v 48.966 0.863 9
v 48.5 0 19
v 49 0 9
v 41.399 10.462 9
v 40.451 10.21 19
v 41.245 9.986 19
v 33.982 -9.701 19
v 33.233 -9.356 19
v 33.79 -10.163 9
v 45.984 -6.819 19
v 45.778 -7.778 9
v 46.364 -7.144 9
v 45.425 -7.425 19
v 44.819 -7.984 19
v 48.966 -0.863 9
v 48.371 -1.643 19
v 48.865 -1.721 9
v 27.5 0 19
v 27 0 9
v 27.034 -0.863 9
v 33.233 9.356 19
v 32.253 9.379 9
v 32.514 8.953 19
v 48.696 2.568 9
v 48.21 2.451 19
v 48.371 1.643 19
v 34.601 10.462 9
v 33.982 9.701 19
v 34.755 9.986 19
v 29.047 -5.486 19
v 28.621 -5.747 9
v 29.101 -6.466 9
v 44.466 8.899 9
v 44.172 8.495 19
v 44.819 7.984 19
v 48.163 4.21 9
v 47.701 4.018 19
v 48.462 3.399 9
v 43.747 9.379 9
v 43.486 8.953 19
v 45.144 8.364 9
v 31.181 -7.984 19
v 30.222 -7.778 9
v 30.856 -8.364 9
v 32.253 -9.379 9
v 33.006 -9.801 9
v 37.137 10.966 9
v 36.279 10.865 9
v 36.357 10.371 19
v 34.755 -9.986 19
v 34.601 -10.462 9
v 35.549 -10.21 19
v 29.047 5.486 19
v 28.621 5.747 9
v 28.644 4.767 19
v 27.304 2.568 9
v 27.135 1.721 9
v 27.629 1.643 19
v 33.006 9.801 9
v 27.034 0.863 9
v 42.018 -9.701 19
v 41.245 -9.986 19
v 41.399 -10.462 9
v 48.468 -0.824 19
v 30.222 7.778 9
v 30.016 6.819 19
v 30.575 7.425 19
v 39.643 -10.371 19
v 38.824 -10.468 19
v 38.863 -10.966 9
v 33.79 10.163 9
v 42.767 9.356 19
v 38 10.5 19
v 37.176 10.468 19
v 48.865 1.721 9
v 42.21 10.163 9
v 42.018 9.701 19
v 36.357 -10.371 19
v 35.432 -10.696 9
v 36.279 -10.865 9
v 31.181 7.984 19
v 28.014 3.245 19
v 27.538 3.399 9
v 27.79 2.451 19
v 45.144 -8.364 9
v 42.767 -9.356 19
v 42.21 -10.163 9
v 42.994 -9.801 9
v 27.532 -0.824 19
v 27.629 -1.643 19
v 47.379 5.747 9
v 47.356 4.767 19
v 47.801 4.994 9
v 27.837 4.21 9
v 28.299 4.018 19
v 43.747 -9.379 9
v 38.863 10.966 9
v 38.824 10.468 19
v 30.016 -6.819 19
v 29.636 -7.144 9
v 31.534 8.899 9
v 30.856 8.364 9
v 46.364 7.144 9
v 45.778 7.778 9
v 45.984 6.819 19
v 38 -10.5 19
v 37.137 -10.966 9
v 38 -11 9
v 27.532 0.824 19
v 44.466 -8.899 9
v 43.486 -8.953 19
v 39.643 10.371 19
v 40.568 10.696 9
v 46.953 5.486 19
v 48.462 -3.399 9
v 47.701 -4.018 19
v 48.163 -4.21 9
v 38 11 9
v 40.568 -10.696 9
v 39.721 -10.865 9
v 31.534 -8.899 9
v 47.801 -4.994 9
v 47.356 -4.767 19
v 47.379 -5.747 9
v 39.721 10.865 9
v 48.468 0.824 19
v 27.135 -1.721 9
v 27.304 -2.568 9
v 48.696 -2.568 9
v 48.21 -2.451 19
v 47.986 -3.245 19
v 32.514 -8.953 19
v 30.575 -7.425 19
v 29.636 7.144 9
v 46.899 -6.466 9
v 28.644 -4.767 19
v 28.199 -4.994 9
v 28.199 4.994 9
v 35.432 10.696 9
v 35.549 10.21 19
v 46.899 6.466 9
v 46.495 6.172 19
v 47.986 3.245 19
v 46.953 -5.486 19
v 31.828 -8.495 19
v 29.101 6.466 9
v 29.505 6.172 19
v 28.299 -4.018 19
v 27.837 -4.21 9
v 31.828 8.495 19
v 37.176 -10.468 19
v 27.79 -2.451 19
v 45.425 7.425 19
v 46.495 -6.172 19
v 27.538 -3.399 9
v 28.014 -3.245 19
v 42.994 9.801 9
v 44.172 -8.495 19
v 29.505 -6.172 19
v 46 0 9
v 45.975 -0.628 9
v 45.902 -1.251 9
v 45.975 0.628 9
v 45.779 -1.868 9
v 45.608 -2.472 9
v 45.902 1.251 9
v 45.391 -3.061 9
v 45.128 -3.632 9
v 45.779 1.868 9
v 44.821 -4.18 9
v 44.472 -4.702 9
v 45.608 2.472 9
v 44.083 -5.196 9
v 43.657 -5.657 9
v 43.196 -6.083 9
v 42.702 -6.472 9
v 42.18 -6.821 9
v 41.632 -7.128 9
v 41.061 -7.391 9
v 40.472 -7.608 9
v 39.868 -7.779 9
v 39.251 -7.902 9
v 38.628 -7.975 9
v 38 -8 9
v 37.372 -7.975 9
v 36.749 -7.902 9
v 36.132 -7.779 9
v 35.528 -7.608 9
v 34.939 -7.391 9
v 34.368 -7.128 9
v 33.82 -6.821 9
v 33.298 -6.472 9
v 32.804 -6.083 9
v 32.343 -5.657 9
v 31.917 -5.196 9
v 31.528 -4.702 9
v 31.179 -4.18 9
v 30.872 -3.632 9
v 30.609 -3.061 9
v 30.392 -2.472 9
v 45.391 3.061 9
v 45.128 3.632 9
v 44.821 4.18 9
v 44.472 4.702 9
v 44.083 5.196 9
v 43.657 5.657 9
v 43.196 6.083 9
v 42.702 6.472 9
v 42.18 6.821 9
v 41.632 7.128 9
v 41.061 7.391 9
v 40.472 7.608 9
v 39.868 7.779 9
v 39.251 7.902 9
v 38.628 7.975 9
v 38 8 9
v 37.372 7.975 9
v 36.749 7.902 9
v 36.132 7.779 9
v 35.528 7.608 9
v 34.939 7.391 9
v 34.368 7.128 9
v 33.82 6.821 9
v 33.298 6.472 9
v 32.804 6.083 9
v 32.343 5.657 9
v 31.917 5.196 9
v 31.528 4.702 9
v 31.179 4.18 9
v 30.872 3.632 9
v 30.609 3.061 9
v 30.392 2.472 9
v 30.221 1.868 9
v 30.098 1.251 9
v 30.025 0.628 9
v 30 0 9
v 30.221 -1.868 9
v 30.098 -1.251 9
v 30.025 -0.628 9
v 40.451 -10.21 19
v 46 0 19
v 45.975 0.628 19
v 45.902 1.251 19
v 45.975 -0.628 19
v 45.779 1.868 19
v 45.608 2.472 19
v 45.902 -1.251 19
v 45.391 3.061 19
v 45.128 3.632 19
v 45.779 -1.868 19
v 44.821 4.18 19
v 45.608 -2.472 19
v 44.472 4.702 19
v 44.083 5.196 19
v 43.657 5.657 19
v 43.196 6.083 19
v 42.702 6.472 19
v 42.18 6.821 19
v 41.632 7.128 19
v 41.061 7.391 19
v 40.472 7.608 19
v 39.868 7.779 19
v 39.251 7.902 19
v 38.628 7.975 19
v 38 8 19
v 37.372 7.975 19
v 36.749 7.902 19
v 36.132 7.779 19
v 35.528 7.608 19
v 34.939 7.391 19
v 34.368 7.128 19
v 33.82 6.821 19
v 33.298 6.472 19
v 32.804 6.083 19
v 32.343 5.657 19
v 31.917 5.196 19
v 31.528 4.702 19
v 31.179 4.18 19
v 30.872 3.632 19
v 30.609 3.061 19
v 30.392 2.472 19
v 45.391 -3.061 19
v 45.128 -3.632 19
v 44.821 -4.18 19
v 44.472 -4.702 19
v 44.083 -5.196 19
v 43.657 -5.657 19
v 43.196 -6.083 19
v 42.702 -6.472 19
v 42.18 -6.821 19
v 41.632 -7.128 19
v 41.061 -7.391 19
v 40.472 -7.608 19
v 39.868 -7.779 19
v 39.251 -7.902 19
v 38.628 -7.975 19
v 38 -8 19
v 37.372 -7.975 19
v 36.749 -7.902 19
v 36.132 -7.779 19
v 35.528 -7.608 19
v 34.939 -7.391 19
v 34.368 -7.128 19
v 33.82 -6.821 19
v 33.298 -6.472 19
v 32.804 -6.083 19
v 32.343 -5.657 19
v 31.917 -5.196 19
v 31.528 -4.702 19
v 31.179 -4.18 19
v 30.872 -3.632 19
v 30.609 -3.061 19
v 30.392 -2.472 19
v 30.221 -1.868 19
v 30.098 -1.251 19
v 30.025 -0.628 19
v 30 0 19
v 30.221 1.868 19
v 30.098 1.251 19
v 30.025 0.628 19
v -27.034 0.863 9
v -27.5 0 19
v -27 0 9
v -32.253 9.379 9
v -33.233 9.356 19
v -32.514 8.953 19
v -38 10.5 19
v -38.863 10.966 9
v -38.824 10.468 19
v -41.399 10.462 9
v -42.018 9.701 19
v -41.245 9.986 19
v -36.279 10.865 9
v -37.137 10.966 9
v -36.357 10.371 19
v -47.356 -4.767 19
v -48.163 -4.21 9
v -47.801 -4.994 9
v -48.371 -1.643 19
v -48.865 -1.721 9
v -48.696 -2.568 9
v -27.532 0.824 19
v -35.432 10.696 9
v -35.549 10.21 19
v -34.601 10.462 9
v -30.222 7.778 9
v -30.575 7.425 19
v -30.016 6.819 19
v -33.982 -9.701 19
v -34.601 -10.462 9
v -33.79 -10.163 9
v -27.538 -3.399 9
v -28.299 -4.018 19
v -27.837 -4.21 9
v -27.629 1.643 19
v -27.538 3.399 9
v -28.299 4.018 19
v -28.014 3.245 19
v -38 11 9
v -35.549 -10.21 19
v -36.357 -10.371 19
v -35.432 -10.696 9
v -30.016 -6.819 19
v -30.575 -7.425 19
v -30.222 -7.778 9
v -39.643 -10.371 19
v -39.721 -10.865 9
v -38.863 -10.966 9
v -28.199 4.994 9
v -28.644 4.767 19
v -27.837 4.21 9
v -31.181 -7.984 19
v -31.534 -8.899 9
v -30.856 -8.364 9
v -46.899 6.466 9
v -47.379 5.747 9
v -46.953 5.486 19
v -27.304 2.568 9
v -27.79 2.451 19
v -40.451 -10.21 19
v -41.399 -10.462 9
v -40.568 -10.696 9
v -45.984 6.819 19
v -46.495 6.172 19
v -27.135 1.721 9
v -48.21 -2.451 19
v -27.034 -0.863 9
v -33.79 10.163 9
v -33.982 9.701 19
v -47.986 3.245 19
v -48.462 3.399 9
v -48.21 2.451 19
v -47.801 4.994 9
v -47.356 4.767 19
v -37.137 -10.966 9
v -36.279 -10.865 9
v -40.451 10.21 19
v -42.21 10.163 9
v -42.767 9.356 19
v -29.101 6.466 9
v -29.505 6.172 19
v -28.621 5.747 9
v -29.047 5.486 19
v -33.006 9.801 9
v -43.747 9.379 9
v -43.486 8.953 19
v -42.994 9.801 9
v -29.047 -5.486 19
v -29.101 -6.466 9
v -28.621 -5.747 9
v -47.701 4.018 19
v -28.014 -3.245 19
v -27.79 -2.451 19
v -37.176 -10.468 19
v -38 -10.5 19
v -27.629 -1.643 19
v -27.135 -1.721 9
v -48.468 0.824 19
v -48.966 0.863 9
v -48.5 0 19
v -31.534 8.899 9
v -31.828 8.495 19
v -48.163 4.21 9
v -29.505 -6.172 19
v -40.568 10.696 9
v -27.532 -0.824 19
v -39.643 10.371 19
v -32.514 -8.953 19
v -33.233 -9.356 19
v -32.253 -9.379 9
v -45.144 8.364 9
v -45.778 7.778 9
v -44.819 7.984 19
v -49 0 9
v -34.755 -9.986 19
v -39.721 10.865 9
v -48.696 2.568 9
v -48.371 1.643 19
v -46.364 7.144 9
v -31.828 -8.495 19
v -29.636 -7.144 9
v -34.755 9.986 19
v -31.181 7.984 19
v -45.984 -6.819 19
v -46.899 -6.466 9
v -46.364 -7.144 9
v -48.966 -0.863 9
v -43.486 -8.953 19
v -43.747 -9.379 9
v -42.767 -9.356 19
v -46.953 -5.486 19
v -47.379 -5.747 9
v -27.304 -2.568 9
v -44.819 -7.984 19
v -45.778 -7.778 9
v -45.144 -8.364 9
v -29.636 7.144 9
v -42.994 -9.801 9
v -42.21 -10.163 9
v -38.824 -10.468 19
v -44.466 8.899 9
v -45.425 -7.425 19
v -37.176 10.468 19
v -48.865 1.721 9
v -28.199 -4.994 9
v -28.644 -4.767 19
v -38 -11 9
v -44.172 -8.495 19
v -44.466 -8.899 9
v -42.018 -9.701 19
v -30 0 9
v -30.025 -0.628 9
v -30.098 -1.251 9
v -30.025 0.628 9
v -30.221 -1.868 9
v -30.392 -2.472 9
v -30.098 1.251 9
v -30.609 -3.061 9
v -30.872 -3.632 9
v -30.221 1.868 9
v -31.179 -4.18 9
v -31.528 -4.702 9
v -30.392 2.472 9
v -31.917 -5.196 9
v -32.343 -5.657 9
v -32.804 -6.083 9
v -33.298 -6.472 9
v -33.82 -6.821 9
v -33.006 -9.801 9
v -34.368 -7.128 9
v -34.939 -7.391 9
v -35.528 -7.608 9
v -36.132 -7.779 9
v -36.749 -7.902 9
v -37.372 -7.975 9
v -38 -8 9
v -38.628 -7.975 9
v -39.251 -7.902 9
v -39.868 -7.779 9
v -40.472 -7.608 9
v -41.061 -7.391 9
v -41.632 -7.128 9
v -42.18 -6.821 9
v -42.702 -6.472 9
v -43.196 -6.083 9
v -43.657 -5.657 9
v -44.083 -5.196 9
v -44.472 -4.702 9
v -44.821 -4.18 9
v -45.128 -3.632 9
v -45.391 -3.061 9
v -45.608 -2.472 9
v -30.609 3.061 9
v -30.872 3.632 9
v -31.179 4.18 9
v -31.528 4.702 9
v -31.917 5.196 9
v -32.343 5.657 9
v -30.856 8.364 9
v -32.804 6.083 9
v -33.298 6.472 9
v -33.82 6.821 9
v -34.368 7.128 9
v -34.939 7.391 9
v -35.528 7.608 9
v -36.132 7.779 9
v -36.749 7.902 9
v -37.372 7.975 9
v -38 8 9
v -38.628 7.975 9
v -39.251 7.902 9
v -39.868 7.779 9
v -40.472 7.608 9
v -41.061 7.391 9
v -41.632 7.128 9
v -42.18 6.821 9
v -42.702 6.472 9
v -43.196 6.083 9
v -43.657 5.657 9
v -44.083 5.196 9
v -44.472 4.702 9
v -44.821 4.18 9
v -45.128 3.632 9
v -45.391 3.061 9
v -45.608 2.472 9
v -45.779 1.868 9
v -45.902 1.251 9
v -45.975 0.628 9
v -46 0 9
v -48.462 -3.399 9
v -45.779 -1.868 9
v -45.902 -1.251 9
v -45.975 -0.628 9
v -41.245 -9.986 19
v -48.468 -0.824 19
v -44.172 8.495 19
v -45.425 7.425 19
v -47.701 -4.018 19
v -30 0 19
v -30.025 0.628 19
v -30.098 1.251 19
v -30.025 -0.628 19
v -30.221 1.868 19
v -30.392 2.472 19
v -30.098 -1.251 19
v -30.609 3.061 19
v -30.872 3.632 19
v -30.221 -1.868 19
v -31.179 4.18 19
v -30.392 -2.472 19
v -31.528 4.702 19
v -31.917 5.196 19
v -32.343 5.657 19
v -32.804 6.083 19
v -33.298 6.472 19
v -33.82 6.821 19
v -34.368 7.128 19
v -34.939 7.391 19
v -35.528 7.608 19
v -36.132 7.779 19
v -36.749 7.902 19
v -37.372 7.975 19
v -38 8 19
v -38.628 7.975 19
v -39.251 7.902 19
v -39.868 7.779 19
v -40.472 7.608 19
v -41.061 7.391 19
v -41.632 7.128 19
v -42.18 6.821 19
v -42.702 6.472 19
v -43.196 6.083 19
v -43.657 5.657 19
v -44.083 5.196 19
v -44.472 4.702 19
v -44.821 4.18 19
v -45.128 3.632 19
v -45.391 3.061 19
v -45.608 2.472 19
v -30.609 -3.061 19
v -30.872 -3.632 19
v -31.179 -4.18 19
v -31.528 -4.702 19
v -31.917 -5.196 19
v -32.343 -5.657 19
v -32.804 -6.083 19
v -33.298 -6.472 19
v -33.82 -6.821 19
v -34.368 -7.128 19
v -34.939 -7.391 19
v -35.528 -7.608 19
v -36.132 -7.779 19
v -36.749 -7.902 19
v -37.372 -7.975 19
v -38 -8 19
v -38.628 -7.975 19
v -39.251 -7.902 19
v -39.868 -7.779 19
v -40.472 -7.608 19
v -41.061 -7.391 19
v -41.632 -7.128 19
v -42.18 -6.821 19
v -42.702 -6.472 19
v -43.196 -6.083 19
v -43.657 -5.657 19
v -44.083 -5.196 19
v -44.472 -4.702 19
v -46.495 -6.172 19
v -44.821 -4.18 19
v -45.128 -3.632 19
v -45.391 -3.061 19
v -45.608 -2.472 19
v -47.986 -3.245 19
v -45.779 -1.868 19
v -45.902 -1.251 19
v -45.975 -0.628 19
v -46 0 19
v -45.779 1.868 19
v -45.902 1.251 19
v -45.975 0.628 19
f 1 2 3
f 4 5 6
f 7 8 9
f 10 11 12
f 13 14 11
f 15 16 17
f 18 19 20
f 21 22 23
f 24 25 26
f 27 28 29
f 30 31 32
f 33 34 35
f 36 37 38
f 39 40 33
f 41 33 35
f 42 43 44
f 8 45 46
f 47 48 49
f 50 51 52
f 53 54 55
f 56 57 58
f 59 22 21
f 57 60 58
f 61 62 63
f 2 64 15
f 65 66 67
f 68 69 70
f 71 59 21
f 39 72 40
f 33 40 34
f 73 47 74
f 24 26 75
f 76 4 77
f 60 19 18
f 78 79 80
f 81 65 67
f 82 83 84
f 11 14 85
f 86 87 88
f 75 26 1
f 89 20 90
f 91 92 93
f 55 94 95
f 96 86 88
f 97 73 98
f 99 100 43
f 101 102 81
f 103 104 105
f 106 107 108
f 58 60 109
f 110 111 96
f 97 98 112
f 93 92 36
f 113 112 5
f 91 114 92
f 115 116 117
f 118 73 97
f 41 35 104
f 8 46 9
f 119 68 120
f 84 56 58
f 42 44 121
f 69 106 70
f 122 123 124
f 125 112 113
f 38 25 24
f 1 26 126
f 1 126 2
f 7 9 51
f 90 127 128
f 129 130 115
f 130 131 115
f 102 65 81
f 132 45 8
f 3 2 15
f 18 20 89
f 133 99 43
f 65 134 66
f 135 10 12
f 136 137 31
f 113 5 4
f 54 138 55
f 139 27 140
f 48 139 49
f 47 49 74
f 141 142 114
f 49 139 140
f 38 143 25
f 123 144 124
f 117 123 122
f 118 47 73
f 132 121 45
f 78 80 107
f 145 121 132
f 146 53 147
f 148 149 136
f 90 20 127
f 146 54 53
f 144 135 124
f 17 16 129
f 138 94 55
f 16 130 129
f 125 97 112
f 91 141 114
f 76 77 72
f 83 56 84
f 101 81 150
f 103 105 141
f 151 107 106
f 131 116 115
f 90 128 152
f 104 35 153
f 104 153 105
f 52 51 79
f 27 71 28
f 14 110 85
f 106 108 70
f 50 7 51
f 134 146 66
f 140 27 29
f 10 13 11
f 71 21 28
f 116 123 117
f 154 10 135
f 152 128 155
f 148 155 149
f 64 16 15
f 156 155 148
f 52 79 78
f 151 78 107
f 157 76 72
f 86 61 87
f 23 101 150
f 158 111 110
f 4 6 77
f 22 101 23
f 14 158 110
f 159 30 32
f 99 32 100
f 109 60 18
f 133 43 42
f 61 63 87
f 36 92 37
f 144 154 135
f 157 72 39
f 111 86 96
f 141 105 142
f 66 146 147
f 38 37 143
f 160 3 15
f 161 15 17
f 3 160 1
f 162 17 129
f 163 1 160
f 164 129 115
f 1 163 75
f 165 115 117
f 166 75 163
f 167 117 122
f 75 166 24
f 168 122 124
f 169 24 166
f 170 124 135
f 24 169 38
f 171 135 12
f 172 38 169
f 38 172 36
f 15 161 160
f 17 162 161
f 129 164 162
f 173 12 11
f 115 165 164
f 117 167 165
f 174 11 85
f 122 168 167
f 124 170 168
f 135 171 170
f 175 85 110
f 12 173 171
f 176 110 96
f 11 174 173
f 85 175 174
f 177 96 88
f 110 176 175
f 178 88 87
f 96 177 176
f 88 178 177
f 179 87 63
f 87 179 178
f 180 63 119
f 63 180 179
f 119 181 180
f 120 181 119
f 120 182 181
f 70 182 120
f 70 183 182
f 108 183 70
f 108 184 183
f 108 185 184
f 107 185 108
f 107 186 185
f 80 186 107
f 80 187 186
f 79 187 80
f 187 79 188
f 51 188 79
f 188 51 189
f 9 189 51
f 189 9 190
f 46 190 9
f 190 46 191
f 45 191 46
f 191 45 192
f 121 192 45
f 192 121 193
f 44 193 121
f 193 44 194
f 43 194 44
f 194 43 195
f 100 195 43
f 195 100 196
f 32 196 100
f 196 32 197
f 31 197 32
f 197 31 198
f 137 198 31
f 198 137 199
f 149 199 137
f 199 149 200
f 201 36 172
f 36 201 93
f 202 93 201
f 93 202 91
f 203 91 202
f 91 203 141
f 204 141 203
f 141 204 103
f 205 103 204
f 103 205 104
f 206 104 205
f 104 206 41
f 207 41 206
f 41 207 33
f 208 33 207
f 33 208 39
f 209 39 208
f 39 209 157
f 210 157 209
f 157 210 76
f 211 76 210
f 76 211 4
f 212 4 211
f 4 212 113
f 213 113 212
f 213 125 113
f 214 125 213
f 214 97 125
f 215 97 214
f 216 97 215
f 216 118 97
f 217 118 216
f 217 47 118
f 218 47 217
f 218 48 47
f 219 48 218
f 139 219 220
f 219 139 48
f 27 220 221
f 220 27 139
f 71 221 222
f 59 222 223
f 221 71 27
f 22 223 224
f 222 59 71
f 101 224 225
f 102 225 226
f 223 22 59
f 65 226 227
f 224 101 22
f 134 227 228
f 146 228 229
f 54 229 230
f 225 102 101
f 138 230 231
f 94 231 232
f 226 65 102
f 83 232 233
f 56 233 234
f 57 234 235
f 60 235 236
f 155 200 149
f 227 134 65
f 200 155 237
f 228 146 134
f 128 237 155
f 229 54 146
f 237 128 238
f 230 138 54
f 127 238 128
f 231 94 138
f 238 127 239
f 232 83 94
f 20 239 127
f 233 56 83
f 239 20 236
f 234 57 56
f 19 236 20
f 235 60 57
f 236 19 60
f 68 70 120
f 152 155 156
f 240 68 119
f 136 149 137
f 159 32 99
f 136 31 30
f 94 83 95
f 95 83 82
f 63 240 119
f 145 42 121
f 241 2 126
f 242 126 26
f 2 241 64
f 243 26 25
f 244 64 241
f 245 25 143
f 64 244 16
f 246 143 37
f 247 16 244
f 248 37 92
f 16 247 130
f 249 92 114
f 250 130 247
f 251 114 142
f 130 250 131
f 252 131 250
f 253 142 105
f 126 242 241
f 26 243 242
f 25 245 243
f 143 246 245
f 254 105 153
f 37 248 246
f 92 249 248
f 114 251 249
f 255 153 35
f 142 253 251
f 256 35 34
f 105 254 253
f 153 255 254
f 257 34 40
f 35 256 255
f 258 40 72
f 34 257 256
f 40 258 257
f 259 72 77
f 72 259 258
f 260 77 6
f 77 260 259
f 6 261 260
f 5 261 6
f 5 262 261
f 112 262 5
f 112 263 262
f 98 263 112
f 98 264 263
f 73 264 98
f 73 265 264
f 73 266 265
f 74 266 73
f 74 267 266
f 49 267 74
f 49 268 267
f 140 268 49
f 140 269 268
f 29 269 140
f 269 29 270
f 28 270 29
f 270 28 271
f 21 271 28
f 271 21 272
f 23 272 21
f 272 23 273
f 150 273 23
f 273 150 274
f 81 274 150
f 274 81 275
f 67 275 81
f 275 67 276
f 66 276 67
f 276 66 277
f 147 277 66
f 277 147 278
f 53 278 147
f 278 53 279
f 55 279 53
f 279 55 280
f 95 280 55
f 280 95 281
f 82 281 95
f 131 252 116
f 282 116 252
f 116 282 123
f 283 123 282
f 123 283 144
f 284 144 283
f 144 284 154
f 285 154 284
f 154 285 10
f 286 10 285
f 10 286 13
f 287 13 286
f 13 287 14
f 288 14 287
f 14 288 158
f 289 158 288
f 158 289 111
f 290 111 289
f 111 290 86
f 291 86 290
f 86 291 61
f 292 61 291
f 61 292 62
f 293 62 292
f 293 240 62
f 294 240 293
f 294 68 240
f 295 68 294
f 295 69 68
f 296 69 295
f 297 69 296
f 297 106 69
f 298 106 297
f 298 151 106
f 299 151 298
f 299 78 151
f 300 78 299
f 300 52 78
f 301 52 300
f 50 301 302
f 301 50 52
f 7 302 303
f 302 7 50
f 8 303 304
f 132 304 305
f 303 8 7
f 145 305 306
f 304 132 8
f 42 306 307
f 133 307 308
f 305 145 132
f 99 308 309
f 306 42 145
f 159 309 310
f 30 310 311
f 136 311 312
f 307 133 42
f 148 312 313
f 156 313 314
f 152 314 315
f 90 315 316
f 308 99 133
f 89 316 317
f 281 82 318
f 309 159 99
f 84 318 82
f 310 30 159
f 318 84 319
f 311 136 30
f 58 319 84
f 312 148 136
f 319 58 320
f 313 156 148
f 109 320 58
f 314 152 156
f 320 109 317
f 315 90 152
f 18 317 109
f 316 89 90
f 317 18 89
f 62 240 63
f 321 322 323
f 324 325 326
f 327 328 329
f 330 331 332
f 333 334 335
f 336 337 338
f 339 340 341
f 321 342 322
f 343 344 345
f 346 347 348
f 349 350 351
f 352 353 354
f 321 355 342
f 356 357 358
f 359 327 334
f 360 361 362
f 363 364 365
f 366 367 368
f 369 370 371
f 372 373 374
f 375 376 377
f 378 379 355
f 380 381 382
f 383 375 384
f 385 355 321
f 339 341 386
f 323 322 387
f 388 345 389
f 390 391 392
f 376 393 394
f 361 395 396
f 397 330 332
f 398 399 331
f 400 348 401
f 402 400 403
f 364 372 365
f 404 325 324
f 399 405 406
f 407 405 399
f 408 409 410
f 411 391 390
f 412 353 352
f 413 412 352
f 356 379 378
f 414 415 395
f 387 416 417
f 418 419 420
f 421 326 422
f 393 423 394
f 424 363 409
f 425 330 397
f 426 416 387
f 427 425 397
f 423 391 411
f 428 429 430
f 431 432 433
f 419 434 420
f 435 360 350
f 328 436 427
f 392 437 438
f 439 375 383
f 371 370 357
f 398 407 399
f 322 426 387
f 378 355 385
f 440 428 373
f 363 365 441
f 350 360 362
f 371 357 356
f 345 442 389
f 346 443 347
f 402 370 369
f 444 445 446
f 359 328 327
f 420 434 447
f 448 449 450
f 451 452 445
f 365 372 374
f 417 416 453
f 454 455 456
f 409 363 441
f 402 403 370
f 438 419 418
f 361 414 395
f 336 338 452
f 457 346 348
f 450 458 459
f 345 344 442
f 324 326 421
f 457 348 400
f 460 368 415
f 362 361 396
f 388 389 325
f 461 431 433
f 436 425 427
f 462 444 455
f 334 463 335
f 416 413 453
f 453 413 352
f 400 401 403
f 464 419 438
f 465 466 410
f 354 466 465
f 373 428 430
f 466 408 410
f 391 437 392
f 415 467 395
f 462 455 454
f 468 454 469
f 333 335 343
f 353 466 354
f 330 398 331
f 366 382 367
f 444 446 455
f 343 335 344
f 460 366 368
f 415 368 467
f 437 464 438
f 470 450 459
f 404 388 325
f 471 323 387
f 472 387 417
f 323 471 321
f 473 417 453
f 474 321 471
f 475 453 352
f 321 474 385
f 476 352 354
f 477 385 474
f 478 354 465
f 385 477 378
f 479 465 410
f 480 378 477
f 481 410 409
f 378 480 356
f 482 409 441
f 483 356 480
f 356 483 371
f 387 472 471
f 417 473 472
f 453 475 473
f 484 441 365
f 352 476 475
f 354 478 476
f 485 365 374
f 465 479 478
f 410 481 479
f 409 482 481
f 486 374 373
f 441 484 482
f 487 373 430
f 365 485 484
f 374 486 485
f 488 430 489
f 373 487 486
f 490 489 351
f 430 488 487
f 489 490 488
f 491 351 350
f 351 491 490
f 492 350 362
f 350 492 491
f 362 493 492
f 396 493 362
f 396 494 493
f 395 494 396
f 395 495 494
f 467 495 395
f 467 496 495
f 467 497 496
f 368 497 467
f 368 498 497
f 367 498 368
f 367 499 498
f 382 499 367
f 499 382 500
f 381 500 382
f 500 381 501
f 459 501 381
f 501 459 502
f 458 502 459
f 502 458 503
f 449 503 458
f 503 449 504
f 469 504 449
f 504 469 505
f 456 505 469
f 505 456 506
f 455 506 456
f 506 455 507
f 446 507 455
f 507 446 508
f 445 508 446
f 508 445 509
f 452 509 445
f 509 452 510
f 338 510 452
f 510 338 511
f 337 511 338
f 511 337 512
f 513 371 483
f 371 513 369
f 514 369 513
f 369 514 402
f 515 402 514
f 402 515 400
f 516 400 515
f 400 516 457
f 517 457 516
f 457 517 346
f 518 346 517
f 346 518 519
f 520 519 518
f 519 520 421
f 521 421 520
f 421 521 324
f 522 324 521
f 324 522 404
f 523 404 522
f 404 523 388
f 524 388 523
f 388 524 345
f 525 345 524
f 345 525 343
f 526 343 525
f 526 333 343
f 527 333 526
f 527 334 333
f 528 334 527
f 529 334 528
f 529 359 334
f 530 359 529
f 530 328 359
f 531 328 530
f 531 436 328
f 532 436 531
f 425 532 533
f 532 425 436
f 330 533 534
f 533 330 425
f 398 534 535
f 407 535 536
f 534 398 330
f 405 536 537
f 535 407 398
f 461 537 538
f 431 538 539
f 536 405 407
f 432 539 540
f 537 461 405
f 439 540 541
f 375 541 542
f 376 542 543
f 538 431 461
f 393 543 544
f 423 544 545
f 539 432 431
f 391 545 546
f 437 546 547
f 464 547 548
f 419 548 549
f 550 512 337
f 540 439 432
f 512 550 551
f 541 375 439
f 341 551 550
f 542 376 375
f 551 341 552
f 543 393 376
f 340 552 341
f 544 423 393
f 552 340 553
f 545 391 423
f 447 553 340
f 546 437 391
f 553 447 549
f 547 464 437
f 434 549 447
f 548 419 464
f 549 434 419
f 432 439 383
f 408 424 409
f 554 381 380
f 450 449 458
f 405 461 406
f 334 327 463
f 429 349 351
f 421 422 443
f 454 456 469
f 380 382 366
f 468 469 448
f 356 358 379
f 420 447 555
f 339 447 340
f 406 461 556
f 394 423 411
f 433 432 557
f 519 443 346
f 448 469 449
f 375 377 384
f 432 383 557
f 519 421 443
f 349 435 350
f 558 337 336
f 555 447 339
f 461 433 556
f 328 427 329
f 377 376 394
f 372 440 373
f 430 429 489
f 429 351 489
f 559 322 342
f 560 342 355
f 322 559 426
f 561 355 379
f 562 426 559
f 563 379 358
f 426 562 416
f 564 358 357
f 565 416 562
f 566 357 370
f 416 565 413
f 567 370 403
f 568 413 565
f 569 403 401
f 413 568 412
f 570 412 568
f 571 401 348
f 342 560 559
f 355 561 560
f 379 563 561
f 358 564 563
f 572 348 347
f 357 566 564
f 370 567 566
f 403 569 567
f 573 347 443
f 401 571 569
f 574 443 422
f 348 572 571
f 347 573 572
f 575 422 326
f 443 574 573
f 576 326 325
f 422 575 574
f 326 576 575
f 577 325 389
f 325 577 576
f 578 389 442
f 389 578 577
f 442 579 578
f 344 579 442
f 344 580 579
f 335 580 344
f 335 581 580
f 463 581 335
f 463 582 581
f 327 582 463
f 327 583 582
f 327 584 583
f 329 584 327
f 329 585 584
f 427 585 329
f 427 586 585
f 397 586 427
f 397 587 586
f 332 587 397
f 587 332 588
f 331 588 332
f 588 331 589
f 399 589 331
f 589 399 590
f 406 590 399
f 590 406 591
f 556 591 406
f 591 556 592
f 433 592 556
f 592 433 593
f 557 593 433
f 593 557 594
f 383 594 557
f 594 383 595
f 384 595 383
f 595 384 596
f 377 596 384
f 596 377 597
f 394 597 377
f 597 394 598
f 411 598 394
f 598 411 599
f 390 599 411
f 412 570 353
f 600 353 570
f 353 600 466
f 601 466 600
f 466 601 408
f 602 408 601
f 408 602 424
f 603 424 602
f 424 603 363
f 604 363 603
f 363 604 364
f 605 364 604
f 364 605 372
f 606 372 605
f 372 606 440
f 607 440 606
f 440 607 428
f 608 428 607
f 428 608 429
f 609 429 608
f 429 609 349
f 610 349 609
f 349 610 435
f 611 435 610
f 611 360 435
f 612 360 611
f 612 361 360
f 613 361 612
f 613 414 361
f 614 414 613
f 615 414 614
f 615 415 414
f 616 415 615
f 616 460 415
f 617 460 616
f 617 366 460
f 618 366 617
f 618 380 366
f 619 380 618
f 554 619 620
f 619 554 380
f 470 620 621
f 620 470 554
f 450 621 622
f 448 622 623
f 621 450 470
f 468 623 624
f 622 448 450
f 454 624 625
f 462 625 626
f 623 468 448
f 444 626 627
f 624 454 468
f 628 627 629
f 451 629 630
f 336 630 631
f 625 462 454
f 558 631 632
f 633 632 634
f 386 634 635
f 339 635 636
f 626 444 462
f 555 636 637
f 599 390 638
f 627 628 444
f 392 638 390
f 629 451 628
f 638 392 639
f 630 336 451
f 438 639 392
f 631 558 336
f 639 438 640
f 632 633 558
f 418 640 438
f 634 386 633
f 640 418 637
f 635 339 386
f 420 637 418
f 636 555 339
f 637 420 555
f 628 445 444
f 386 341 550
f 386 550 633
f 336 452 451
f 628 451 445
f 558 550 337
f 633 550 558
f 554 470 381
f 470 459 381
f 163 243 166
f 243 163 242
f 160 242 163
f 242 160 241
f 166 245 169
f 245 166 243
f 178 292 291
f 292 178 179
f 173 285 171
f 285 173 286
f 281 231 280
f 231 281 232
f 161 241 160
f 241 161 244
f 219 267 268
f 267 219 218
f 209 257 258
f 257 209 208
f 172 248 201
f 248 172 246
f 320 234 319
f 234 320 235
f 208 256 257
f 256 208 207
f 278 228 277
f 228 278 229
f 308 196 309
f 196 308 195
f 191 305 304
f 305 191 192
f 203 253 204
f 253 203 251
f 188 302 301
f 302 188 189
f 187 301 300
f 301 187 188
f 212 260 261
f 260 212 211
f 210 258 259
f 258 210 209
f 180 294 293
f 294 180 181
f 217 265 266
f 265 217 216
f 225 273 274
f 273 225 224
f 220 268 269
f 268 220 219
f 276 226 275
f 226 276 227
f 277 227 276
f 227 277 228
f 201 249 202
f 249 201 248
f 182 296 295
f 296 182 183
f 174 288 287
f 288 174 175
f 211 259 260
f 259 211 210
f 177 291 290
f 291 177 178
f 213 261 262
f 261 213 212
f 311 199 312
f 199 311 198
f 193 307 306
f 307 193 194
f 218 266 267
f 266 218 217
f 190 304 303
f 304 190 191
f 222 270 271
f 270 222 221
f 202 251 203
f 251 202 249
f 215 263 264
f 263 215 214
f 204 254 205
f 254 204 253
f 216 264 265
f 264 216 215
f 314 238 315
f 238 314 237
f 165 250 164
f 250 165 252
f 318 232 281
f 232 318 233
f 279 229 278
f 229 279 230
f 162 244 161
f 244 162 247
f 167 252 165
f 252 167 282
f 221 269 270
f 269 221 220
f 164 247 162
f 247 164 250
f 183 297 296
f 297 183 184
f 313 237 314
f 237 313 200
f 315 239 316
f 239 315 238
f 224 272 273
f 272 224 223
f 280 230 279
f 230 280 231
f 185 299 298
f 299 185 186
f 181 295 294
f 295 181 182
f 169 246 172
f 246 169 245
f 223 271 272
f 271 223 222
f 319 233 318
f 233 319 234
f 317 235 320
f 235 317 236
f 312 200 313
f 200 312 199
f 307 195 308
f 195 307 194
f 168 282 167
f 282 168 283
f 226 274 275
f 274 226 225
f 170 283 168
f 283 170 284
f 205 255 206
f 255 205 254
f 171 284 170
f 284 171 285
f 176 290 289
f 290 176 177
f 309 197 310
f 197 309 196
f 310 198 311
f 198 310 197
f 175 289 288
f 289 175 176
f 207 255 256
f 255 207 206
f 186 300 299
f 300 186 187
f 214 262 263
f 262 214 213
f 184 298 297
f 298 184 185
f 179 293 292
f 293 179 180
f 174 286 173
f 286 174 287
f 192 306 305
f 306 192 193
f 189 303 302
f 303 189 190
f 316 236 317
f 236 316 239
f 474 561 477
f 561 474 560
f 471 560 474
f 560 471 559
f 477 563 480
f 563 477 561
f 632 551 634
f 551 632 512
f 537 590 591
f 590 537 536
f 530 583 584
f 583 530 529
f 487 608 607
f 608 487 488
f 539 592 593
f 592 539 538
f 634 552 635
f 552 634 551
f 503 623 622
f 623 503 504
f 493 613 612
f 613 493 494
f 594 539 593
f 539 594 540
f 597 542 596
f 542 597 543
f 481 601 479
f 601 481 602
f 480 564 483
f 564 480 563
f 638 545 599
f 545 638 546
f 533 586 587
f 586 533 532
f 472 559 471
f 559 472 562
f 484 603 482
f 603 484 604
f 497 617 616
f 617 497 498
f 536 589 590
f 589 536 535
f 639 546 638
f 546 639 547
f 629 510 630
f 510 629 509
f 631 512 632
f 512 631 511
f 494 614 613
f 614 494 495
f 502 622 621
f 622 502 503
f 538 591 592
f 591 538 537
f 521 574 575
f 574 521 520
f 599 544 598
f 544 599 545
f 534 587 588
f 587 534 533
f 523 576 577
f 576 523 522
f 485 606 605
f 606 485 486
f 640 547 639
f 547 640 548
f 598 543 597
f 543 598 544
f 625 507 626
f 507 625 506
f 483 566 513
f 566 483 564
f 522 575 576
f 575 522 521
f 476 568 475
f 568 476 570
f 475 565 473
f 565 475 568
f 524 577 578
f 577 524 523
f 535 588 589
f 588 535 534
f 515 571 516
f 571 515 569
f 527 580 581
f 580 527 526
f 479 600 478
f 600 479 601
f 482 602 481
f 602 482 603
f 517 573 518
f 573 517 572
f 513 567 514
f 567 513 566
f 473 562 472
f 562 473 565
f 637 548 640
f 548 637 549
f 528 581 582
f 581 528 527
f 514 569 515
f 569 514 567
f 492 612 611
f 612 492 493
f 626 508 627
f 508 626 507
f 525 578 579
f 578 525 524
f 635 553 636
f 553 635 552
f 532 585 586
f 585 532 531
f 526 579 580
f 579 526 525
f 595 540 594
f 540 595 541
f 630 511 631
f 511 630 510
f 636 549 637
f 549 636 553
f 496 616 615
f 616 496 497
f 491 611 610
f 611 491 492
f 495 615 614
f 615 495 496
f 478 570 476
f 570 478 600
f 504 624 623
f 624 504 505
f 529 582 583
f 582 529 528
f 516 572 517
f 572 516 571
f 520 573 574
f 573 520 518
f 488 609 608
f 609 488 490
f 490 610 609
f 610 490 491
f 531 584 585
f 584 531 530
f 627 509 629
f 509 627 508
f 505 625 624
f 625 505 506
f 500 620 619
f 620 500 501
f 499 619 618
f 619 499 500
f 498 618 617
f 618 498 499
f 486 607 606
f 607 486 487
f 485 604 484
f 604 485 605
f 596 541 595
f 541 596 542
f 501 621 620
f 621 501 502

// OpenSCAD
/* ======================================================================
 *
 *       Filename:  axeZ_top-main.scad
 *
 *    Description:  motors mount 
 *
 *        Version:  1.0
 *        Created:  11 06 2016
 *       Revision:  none
 *       Compiler:  gcc
 *
 *         Author:  Sebastien Chassot (sinux), seba.ptl@sinux.net
 *
 * =====================================================================
 */


support_h = 9;
bearing_d = 14.8;
axe_pos = 76;

axeZ_bottom();
module axeZ_bottom() {
    
    difference(){
        union(){
        /* motor mount */
            linear_extrude(height = support_h, $fn=50)
                import("../profiles/axeZ_top-s0.dxf");
            translate([axe_pos/2, 0, support_h])
                cylinder(d1 = 22, d2 = 21, h = 10, $fn = 80);
            translate([-axe_pos/2, 0, support_h])
                cylinder(d1 = 22, d2 = 21, h = 10, $fn = 80);
            
            translate([0, 0, 8])
                    linear_extrude(height = 11, $fn=50)
                        import("../profiles/axeZ_top-s1.dxf");
            
            
        }
        
//        translate([0, 0, 3])
//            linear_extrude(height = 20, $fn=50)
//                    import("../profiles/axeZ_top-s2.dxf");
        
        translate([26.5, -10, support_h/2])
            rotate([90, 0, 0])
            cylinder(d = 3, h = 15, center = true, $fn = 80);
        translate([-26.5, -10, support_h/2])
            rotate([90, 0, 0])
            cylinder(d = 3, h = 15, center = true, $fn = 80); 
        
        translate([axe_pos/2, 0, 0])
            cylinder(d = 16, h = 50, center = true, $fn = 80);
        translate([-axe_pos/2, 0, 0])
            cylinder(d = 16, h = 50, center = true, $fn = 80);
    }
}
